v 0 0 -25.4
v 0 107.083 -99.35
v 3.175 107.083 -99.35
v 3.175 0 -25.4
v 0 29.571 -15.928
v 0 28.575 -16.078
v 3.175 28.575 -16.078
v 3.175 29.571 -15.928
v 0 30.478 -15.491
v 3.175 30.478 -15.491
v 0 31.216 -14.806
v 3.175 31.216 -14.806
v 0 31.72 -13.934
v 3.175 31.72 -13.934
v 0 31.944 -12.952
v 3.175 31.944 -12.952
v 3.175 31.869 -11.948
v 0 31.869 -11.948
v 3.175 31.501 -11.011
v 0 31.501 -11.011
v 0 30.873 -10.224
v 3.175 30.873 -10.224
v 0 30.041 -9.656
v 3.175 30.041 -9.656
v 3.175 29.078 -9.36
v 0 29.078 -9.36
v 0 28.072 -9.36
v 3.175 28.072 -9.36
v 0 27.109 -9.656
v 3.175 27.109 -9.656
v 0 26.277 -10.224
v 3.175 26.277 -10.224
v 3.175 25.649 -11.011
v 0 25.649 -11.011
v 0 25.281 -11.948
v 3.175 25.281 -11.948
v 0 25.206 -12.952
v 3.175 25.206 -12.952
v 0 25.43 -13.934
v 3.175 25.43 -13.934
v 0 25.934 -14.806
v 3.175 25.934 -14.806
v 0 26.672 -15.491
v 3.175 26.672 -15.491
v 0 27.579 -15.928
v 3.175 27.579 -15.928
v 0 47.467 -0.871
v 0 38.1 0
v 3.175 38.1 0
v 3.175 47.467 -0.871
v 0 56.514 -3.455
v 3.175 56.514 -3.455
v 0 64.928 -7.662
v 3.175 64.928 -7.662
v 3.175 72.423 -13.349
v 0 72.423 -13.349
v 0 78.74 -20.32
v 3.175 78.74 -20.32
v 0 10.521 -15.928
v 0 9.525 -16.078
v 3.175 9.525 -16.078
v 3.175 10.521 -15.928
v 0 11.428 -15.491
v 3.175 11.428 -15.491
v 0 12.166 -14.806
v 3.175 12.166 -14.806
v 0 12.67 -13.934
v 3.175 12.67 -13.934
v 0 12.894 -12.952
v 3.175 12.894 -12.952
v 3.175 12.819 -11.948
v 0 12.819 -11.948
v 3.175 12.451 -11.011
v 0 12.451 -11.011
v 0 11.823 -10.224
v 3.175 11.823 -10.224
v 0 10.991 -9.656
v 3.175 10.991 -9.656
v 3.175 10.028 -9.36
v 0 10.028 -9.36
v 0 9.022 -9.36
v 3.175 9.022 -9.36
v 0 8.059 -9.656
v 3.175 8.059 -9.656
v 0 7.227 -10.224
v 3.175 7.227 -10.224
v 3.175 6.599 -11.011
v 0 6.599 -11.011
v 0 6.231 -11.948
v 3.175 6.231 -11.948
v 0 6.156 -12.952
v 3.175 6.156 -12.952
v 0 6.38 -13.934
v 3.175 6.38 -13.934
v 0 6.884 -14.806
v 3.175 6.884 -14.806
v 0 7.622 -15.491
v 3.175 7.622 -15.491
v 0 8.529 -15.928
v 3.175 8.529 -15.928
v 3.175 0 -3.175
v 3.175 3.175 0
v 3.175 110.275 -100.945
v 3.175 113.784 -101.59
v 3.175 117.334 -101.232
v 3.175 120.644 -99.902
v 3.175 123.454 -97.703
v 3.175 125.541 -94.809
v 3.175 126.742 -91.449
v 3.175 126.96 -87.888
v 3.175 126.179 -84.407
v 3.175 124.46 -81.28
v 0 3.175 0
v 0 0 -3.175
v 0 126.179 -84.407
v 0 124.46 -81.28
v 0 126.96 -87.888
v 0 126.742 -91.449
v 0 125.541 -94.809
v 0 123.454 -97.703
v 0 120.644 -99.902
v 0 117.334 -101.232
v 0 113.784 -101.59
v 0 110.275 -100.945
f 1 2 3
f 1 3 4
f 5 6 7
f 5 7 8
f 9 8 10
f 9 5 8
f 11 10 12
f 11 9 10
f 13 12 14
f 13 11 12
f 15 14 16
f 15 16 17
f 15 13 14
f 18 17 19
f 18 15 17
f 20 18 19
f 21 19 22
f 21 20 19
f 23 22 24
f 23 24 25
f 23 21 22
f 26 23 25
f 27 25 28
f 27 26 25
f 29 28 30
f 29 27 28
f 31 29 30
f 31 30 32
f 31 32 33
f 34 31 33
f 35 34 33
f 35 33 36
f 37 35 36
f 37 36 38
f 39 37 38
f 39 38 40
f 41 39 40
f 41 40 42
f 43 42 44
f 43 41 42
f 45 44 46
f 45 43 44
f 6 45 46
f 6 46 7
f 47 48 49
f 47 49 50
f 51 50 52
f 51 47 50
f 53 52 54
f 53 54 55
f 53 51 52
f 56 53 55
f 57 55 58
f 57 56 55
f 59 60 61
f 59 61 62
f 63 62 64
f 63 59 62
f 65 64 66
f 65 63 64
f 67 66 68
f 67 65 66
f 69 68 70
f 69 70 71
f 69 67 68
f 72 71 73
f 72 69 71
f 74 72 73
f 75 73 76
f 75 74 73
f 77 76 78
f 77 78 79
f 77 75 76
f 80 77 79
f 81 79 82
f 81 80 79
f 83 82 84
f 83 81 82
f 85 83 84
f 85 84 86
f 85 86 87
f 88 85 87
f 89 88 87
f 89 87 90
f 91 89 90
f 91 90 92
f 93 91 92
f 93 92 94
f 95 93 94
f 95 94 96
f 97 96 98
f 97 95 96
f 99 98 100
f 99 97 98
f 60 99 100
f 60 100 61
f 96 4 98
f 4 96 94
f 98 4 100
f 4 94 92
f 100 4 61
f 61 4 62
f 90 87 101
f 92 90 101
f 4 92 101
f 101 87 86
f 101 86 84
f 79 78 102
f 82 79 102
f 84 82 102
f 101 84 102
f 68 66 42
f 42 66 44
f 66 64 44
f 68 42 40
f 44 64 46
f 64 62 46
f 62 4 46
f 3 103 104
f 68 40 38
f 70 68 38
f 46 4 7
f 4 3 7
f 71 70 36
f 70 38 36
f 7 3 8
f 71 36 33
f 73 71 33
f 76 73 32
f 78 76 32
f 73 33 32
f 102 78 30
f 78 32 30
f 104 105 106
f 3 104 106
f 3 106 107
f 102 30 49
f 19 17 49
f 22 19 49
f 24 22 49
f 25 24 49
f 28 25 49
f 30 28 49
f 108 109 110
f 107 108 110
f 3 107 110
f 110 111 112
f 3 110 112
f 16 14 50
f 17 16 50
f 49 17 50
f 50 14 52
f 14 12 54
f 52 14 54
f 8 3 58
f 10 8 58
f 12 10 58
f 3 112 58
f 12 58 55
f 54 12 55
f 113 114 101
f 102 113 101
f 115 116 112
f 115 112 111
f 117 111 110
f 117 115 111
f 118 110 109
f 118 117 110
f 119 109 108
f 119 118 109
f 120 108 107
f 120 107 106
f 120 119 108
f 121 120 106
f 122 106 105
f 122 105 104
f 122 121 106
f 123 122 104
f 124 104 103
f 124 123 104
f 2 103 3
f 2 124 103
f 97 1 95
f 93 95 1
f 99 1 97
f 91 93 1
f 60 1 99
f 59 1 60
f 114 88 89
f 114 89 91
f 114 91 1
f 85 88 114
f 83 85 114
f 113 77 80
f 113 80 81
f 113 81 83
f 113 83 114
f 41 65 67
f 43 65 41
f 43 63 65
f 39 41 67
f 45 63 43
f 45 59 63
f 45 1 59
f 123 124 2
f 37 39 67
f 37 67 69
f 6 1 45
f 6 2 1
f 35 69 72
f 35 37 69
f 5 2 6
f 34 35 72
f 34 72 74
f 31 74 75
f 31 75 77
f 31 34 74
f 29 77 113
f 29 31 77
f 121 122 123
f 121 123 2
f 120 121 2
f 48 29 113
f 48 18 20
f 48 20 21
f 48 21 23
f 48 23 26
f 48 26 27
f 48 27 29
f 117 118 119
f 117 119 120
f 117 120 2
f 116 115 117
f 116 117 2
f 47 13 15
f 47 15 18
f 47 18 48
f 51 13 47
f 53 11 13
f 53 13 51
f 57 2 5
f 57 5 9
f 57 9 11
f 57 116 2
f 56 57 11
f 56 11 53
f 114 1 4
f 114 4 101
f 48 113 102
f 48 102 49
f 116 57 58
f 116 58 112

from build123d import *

# Parameters (mm, degrees)
SKETCH1_R           = 3.3782
BOSS_EXTRUDE1_DEPTH = 3.175
CHAMFER1_SIZE       = 3.175


with BuildPart() as part:
    # Sketch1 → Boss-Extrude1 (new body)
    with BuildSketch(Plane(origin=(0, 0, 0), x_dir=(0, 0, -1), z_dir=(1, 0, 0))):
        with BuildLine():
            Line((0, 0), (0, 38.1))
            ThreePointArc((0, 38.1), (5.363098697, 60.818450651), (20.32, 78.74))
            Line((20.32, 78.74), (81.28, 124.46))
            ThreePointArc((81.28, 124.46), (97.702892705, 123.454183744), (99.350249741, 107.083194588))
            Line((99.350249741, 107.083194588), (25.4, 0))
            Line((25.4, 0), (0, 0))
        make_face()
        with Locations((12.7, 9.525)):
            Circle(SKETCH1_R, mode=Mode.SUBTRACT)
        with Locations((12.7, 28.575)):
            Circle(SKETCH1_R, mode=Mode.SUBTRACT)
    extrude(amount=BOSS_EXTRUDE1_DEPTH)

    # Chamfer1
    chamfer1_edges = [part.edges().sort_by_distance(p)[0] for p in [
        (1.5875, 0, 0),
    ]]
    chamfer(chamfer1_edges, length=CHAMFER1_SIZE)


solid = part.part
